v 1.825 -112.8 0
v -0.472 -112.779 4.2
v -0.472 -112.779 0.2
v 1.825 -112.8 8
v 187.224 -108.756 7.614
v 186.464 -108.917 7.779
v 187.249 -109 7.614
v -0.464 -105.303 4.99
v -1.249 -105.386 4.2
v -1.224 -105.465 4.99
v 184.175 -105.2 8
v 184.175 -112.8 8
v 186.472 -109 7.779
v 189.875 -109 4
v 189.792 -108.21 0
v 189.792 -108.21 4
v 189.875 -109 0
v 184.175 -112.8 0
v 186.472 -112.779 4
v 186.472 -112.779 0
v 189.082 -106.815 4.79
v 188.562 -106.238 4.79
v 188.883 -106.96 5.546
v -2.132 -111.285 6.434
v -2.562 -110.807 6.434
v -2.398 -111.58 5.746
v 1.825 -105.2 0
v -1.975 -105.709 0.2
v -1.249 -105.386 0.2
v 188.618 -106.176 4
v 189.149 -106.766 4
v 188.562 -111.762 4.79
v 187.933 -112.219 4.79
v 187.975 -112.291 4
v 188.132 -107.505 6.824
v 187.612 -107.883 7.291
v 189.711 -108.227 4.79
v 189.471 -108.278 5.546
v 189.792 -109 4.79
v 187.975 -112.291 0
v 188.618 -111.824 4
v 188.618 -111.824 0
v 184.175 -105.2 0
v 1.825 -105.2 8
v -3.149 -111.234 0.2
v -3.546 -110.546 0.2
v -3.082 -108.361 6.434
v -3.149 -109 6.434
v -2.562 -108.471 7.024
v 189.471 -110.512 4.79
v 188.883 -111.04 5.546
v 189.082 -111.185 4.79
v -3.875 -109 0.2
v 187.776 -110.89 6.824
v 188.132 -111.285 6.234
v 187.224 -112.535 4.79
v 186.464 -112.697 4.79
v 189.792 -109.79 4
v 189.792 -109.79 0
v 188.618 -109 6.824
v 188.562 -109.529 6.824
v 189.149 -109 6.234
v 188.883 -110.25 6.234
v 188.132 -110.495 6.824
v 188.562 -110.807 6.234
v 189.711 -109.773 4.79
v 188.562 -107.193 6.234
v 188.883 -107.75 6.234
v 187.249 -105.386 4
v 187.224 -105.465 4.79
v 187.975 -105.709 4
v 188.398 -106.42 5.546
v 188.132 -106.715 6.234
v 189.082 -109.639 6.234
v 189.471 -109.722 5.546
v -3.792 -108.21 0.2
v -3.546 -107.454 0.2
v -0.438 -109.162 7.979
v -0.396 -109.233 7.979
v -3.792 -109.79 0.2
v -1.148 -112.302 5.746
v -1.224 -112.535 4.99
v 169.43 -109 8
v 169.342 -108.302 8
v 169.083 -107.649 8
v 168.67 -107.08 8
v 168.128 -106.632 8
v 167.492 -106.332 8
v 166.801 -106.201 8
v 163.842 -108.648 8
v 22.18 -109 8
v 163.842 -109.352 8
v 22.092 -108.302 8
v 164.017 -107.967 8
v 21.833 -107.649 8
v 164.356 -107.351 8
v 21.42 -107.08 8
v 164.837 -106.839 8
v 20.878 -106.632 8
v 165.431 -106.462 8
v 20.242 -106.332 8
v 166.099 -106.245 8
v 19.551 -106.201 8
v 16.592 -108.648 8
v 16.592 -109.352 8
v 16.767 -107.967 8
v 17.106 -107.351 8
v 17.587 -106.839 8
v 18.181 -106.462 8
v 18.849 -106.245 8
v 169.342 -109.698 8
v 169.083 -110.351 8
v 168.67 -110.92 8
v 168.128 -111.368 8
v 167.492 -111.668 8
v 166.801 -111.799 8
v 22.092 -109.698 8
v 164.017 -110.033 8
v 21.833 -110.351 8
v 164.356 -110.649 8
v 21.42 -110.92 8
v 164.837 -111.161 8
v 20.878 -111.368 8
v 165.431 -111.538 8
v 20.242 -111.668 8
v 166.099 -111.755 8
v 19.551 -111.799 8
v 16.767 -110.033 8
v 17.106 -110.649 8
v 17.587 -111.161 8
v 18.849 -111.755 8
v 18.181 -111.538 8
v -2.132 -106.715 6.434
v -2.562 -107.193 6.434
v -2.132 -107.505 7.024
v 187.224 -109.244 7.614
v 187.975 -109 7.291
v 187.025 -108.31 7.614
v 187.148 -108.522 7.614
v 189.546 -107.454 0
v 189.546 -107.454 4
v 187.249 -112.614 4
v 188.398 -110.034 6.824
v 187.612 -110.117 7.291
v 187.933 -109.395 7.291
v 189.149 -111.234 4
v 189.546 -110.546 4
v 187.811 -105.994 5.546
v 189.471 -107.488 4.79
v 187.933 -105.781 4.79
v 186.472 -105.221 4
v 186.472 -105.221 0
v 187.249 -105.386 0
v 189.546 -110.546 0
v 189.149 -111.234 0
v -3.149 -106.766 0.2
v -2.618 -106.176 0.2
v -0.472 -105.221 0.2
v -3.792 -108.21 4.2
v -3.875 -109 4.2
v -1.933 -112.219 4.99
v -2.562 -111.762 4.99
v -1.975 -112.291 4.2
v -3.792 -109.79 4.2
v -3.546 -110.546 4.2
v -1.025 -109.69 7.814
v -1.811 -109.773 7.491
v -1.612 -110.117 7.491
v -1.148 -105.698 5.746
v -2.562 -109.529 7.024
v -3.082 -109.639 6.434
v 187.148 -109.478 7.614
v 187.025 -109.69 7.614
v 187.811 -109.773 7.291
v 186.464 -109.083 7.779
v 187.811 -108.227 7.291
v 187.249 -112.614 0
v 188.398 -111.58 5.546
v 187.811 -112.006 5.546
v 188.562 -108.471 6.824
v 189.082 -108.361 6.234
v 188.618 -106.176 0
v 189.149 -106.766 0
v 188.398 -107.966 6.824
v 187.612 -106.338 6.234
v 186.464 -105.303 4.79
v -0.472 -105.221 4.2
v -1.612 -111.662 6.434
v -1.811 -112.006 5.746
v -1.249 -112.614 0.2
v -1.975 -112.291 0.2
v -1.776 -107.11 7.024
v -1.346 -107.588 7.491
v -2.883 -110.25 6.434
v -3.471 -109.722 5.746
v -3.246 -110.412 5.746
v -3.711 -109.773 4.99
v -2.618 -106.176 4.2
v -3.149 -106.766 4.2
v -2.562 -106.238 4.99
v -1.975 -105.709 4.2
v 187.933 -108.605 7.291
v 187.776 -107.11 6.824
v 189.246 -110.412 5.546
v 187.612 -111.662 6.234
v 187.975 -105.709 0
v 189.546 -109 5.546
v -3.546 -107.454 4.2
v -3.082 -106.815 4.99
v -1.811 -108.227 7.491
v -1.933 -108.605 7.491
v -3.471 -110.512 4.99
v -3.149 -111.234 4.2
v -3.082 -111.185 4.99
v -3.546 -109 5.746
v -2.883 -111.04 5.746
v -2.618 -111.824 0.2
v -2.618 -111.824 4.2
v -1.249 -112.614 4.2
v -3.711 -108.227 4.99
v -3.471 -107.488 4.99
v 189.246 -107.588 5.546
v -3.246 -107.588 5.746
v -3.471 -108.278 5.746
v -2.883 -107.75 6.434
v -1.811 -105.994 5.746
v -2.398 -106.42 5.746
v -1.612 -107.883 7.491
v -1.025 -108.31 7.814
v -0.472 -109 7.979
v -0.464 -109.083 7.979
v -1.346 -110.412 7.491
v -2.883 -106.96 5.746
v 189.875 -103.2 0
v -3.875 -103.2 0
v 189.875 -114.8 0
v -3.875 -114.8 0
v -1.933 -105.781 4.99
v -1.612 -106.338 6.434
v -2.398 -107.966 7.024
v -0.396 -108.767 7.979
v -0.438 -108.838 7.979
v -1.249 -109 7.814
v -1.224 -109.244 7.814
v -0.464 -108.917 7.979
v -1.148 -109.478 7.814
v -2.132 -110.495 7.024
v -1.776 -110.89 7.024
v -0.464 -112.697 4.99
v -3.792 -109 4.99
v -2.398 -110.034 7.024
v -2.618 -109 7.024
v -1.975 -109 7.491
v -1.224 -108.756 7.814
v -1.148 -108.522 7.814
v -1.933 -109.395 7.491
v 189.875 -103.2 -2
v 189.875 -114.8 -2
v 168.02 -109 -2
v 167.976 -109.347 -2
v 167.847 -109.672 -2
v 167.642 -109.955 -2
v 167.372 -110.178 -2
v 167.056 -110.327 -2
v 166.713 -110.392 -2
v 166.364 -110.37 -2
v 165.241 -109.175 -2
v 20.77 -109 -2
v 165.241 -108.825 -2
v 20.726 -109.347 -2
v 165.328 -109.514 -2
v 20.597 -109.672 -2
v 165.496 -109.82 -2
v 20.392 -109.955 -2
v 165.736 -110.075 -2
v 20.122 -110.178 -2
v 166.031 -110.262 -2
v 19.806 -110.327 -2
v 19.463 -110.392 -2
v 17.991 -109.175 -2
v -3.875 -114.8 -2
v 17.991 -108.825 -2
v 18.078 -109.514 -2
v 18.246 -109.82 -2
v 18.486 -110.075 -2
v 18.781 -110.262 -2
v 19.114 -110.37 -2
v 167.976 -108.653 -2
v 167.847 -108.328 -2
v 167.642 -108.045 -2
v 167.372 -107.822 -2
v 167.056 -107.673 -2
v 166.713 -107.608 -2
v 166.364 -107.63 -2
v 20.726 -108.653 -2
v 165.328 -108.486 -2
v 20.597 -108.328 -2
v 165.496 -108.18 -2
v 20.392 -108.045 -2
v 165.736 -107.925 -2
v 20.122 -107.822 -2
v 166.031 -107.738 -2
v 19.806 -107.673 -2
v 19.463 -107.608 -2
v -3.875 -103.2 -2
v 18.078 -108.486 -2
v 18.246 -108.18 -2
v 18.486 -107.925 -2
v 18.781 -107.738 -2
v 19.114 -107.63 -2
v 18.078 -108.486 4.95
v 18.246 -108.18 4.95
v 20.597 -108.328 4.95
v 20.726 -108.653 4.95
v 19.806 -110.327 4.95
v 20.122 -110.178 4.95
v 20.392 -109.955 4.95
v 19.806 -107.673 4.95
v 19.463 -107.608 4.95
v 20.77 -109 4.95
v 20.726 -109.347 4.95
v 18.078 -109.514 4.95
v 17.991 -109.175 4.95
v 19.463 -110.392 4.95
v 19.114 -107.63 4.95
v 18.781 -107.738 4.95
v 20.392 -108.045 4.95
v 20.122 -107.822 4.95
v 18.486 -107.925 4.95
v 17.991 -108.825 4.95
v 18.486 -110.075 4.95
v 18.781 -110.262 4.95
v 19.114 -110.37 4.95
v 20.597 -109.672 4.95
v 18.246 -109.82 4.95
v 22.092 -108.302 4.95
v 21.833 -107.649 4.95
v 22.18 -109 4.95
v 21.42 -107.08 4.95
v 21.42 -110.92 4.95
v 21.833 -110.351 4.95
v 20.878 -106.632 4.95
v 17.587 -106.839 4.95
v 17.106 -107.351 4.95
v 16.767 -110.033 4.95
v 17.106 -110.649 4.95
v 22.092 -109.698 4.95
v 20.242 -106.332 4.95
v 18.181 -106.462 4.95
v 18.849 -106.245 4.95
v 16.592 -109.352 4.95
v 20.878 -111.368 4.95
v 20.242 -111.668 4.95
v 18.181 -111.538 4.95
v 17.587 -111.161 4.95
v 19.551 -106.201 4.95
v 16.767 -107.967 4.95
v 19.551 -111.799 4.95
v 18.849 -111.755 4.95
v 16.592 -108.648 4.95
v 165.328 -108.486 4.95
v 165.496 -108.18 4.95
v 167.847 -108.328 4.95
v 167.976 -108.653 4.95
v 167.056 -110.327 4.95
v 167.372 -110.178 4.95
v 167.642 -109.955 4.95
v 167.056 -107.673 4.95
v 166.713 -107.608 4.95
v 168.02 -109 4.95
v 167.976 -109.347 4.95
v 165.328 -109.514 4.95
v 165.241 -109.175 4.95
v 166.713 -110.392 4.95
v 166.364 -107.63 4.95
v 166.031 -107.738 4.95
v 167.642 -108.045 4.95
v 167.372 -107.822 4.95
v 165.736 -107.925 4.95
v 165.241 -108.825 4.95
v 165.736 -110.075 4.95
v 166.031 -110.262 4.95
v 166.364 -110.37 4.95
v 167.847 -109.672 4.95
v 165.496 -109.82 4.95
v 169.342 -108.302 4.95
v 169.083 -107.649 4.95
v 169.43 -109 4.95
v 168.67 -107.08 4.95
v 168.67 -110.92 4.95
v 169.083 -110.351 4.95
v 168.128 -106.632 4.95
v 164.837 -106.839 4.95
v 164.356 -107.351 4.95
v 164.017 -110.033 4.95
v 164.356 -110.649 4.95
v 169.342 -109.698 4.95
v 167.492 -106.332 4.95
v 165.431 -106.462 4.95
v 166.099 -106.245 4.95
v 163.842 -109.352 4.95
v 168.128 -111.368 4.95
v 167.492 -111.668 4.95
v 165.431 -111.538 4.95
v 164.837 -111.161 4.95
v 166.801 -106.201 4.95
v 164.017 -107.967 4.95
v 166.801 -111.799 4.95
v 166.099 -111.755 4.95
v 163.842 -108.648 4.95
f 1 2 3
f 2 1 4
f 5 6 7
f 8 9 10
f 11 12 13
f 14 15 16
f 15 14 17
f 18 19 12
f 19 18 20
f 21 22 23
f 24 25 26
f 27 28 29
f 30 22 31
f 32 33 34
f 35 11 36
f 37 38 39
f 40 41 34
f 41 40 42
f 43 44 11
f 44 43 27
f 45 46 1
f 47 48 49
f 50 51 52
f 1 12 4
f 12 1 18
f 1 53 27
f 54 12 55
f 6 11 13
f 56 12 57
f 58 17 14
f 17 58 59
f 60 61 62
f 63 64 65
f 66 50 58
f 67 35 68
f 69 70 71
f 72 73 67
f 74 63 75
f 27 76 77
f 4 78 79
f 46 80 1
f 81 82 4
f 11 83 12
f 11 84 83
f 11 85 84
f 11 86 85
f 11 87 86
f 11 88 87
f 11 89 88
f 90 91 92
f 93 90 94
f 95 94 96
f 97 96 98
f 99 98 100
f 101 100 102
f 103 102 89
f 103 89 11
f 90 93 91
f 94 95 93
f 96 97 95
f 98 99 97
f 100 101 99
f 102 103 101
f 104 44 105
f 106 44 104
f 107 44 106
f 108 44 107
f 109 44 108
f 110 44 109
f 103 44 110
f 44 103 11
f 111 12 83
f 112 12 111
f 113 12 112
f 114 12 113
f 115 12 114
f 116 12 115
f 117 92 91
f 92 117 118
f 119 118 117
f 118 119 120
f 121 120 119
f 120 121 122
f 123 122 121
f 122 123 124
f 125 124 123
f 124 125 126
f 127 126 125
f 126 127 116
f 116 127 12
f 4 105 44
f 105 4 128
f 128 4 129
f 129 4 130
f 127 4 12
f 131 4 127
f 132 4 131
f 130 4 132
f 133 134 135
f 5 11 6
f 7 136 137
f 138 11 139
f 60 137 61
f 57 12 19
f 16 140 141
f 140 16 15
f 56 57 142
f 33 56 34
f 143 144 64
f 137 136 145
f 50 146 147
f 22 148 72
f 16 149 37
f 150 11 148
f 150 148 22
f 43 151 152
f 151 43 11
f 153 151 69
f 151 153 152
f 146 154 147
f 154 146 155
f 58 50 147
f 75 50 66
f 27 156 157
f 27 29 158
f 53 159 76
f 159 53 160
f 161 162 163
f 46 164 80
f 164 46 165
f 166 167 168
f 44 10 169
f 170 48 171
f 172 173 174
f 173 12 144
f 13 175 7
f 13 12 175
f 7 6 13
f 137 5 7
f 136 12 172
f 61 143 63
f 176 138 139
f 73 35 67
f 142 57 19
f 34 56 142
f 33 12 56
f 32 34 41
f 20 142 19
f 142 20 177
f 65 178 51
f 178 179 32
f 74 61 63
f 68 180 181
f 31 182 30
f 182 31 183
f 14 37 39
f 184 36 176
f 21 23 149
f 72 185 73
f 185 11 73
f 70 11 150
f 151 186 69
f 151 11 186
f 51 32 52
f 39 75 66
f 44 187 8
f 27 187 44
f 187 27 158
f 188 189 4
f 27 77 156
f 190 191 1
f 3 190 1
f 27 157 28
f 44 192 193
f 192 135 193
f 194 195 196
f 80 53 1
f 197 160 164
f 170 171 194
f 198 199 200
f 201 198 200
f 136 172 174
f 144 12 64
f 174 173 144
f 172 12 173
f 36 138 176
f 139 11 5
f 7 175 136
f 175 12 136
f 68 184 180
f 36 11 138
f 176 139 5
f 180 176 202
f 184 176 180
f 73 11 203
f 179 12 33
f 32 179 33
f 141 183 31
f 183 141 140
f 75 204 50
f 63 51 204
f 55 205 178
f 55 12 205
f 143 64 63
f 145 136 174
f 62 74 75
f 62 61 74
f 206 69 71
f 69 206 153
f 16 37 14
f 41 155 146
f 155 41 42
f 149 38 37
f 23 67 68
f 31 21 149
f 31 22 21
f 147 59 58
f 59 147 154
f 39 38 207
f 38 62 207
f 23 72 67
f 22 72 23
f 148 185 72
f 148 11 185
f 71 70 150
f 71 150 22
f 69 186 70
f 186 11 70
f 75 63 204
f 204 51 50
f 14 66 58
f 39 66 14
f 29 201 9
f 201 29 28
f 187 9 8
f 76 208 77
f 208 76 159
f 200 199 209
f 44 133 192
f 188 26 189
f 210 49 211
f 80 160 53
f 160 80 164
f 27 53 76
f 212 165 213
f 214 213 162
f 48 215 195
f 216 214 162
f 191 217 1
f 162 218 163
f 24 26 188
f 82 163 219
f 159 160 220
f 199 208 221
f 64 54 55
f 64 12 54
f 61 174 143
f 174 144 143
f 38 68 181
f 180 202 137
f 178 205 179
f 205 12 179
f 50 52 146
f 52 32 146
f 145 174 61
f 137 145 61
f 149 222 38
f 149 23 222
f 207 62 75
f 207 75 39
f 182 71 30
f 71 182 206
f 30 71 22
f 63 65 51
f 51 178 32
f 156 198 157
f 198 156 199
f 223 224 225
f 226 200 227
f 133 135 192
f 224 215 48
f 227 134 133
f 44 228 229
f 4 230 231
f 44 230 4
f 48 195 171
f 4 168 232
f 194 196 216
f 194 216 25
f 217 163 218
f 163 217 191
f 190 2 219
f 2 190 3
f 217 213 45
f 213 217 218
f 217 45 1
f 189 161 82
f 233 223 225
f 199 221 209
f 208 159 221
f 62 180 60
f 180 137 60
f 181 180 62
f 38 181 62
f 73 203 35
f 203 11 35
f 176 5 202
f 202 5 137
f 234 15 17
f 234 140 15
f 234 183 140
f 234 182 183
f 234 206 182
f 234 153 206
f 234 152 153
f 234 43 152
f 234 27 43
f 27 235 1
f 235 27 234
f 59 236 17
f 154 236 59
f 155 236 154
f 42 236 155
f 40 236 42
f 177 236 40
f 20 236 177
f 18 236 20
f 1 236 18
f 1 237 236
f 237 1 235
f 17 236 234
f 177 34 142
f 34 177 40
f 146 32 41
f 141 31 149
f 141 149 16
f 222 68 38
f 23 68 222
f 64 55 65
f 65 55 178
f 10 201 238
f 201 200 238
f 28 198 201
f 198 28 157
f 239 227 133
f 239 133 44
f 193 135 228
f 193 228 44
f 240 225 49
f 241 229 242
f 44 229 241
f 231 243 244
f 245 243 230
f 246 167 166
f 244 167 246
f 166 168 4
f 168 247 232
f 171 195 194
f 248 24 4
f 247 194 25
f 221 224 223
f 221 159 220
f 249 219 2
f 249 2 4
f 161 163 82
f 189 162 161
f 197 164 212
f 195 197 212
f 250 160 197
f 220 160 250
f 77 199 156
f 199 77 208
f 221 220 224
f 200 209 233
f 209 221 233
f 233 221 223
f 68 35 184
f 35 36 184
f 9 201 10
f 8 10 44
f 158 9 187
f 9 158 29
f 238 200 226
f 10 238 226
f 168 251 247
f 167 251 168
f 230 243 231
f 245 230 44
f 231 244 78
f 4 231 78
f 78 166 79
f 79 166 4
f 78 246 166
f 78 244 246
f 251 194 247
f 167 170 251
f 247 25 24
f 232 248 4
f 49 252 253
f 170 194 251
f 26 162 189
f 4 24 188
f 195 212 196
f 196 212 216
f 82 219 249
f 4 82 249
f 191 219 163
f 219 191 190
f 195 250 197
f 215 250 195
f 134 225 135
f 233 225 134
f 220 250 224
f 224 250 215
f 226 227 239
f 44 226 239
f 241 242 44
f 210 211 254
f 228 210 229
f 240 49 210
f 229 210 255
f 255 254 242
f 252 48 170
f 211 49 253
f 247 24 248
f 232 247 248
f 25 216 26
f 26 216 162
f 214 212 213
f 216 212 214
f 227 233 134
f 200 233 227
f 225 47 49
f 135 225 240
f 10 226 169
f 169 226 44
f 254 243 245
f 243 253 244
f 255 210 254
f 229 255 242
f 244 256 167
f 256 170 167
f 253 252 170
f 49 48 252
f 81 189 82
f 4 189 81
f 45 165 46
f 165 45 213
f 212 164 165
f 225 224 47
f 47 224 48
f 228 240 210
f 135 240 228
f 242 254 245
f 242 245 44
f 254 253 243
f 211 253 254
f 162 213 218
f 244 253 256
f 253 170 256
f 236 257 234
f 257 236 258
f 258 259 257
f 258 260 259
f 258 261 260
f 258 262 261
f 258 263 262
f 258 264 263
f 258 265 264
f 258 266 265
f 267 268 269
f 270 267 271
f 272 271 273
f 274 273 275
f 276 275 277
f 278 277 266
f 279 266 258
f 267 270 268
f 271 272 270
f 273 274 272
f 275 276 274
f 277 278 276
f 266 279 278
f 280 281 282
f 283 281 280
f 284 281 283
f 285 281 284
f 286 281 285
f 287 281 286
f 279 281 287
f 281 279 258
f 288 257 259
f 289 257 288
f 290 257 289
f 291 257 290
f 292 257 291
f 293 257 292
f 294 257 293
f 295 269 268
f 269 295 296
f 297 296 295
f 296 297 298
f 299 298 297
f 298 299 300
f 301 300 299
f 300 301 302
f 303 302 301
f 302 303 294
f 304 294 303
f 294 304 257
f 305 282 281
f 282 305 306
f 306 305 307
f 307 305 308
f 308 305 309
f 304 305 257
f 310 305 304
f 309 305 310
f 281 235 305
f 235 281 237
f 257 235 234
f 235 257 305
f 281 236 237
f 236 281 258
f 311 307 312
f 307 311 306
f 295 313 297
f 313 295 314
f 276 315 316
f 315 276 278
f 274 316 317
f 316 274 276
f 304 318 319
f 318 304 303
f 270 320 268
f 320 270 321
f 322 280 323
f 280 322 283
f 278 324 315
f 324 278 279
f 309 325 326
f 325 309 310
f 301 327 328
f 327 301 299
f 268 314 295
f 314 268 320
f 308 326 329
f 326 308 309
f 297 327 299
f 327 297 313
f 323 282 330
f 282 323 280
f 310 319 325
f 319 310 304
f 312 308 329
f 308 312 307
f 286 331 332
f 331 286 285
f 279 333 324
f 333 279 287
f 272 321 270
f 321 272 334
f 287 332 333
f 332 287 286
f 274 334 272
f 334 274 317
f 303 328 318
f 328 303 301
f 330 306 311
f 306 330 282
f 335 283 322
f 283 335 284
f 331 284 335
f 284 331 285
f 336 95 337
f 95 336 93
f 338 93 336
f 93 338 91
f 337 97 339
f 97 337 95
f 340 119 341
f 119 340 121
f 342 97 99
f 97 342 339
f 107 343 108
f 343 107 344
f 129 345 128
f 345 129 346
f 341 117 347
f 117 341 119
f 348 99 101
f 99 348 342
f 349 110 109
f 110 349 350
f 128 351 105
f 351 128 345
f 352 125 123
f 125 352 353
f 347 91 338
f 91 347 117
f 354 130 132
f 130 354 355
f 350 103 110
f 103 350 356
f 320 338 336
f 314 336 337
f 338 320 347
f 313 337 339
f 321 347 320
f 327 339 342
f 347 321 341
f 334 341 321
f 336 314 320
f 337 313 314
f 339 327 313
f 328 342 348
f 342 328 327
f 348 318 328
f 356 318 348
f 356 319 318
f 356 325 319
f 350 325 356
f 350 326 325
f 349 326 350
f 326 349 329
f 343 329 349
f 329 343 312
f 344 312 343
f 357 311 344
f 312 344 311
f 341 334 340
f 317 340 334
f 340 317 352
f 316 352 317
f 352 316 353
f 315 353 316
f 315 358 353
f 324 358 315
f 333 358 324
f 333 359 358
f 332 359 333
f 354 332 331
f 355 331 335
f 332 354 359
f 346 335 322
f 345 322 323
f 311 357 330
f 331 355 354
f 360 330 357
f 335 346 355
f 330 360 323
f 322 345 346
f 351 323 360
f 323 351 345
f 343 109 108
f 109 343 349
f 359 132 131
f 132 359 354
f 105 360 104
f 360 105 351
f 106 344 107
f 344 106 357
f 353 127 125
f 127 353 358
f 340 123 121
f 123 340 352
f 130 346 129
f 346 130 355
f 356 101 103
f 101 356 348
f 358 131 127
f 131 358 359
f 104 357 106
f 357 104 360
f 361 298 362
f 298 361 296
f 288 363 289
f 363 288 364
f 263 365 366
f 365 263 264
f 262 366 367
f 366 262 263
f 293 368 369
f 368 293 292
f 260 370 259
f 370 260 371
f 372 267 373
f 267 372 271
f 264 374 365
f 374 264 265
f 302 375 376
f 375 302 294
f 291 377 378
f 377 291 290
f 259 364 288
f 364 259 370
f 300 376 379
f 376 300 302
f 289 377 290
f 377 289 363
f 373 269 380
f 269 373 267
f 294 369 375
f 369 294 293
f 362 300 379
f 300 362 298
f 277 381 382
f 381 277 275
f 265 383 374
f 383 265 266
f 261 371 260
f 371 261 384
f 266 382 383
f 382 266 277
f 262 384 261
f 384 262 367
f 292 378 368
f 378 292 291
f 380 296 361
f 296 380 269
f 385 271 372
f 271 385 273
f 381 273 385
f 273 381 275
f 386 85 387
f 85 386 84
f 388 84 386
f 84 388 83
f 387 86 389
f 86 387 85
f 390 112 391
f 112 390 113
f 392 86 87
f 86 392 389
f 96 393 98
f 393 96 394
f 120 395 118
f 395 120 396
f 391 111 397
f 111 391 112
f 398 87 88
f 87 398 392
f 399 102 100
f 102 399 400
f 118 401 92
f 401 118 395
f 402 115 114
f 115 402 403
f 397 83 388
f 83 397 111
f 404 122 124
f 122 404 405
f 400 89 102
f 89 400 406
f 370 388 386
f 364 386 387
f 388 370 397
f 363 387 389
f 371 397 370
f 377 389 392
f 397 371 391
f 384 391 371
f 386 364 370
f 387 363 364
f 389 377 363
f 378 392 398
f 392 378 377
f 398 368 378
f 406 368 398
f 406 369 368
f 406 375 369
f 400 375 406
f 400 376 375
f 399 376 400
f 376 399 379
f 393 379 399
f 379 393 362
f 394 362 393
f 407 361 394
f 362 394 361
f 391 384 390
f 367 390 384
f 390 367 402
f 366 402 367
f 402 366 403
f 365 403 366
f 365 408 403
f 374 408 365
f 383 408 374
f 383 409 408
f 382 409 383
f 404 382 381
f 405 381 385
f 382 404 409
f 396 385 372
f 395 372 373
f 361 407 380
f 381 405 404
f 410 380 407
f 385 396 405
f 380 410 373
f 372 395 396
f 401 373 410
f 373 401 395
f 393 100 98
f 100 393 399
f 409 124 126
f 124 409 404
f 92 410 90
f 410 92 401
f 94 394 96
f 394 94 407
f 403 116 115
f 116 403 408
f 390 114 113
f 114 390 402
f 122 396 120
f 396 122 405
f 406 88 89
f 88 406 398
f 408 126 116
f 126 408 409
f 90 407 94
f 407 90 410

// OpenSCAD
// file: ../modules/roundedRail.scad
include<params.scad>;

module roundedRail(width,depth,height) {
    $fn = 30;
    rad = depth/2;
    translate([-width/2,0,0])
    hull() {
        translate([width/2,0,0])
        cube([width-rad*3,depth,height], center = true);
        translate([rad, 0, height/2 - rad]) {
            sphere(rad);
            translate([0,0,-height/2 + 0.5])
            cylinder(1,rad,rad, center = true);
        }
        translate([width - rad,0,0])
        {
            sphere(rad);
            translate([0,0,-height/2 + 0.5])
            cylinder(1,rad,rad, center = true);
        }
    }
}
// file: ../modules/needlebedScrews.scad
include<params.scad>;
//include<needlebed.scad>;

module screwHoles(screw) {
    
    
    // "screw" is passed in during the loop to place holes at either end of the assembly
    if (screw > 0) { //left half
       // spongebar screw
       translate([gauge/2,-(NEEDLE_BED_DEPTH-COMB) + SPONGE_BAR/2, 0]) {
         cylinder(h = needleBedHeight*2 + 1, d = screwDiamSm, center = true, $fn = 25); 
         translate([0,0,railHeight]) 
             cylinder(h = screwHeadHeight*2 + tolerance, d = screwHeadDiamSm, center = true, $fn = 25);   
       }
       // back screw, back cover
       translate([gauge/2, -5, 0]) {
         cylinder(h = needleBedHeight*2 + 1, d = screwDiamSm, center = true, $fn = 25);
                cylinder(h = screwHeadHeight*2 + tolerance, d = screwHeadDiamSm, center = true, $fn = 25);   
       }    
         // front screw, back cover
       translate([gauge/2, -BACK_COVER + 5, 0]) {
         cylinder(h = needleBedHeight*2 + 1, d = screwDiamSm, center = true, $fn = 25);  
          cylinder(h = screwHeadHeight*2 + tolerance, d = screwHeadDiamSm, center = true, $fn = 25);   
       }
     }
     
     if (screw < 0) { //right half
       // spongebar screw
       translate([-gauge/2,-(NEEDLE_BED_DEPTH-COMB) + SPONGE_BAR/2, 0]) {
         cylinder(h = needleBedHeight*2 + 1, d = screwDiamSm, center = true, $fn = 25); 
         translate([0,0,railHeight]) 
             cylinder(h = screwHeadHeight*2 + tolerance, d = screwHeadDiamSm, center = true, $fn = 25);   
       }
       // back screw, back cover
       translate([-gauge/2, -5, 0]) {
         cylinder(h = needleBedHeight*2 + 1, d = screwDiamSm, center = true, $fn = 25);
                cylinder(h = screwHeadHeight*2 + tolerance, d = screwHeadDiamSm, center = true, $fn = 25);   
       }    
         // front screw, back cover
       translate([-gauge/2, -BACK_COVER + 5, 0]) {
         cylinder(h = needleBedHeight*2 + 1, d = screwDiamSm, center = true, $fn = 25);  
          cylinder(h = screwHeadHeight*2 + tolerance, d = screwHeadDiamSm, center = true, $fn = 25);   
       }
     }
  
}

//screwHoles(screw = 1);
module needleBedScrews() {
    for(i = [0:numNeedles-1]) {
        if (i==screwPlacement || i==numNeedles-screwPlacement) {
              translate([gauge*i, 0, 0]) {
              screwHoles(screw = -1); 
              }
        } else if (i == screwPlacement - 1 || i==numNeedles-(screwPlacement + 1)) {
            //LS screw holes
                translate([gauge*i, 0, 0])
                screwHoles(screw = 1);  
        }
    }
}

needleBedScrews() {
}
// file: ../modules/params.scad
/*

Values in `camelCase` are user-variable (within reason); 
values like numNeedles and screwDiam, etc.,  can be modified to
accommodate user preference or hardware subsitution. 

Values in `ALL_CAPS` should be considered CONSTANTS and should
only be modified with *extreme caution* as they will affect the 
relationship between the needles and the cams, which could
prevent stitches from forming correctly.

I recommend only modifying these constants if you are also 
making changes to the cam design in the technical sketch.
*/

$fn = 50;

STANDARD_GAUGE = 4.5;
MID_GAUGE = 6.5;
BULKY_GAUGE = 9.0;
BRIAN_GAUGE = 7.75;

gauge = BRIAN_GAUGE;
// gauge = STANDARD_GAUGE; // I recommend using one of the predefined gauges above
numNeedles = 25;
tolerance = 0.2; // allows a bit of room for parts that have to fit together; adjust according to your printer's precision

// ---
// Hardware dimensions 
// (actual measurements, no tolerances)

// - pan head 6-32 machine screws
screwDiam = 3.45;
screwHeight = 18;
screwHeadDiam = 6.75 + tolerance * 2; 
screwHeadHeight = 2.55 + tolerance * 2;
nutWidth = 7.9;

// - pan head 4-40 machine screws (M3 should also work where these are used)
screwDiamSm = 2.79;
screwHeightSm = 14.62;
screwHeadHeightSm = 2.41 + tolerance * 2;
screwHeadDiamSm = 5.21 + tolerance * 2;
nutHeight = 2.8;

// ---
// Needle dimensions
// - Brother needles
BUTT_HEIGHT = 15;
NEEDLE_WIDTH = 1.25;
NEEDLE_LEG_HEIGHT = 1.85;
HOOK_DIAM = 3.5;

// ---
// Needle Bed Zones
BACK_COVER = 45;
OOW_TRACK = 8;
B_TRACK = 42; // will divvy up working tracks (B & C position) later
C_TRACK = 0;
WORKING_TRACK = B_TRACK + C_TRACK;
HOLD_TRACK = 8;
SPONGE_BAR = 12;
COMB = 29;
NEEDLE_EXTENSION = 34.5;

// ---
// Needle bed dimensions
NEEDLE_BED_DEPTH = BACK_COVER + OOW_TRACK + WORKING_TRACK + HOLD_TRACK + SPONGE_BAR + COMB;
needleBedHeight = screwHeight + 2;
needleSlotHeight = NEEDLE_LEG_HEIGHT * 2 + screwHeadHeight;
needleSlotWidth = NEEDLE_WIDTH + 0.25; // add a small amount of clearance
combWidth = gauge*2/3; // width of cutouts for stitch formation; this gives room for the thickness of the yarn looped around the needle when it pulls back into the slot, but has to balance leaving enough material for the remaining "teeth" to not be too fragile
spongeThickness = 2.5;
spongeBarThickness = needleSlotHeight - NEEDLE_LEG_HEIGHT - spongeThickness;
YARN_DEPOSIT_Y = -155.1;
YARN_DEPOSIT_Z = -needleSlotHeight + HOOK_DIAM;
connectorOffset = 20;

screwPlacement = 3; // how many needles from edge of bed; min 2, max floor(numNeedles/2)

// ---
// Carriage dimensions
// refer to technical sketch
camHeight = BUTT_HEIGHT; // thickness of the tracks the needles ride along
camPlateHeight = 4; // plate behind the cams
CAM_PLATE_WIDTH = 91 * 2; 
CAM_PLATE_DEPTH = NEEDLE_BED_DEPTH - COMB + 6;

railDepth = 8;
railHeight = 8; // ???
xOffset = 16.5;
//vCamScrews = [[34-xOffset, -90.25, 0],[58-xOffset, -74.25, 0],[86-xOffset,-90.25, 0]];

echo(needleSlotHeight);
// main file
include<../modules/params.scad>;
use<../modules/needlebedScrews.scad>;
use<../modules/roundedRail.scad>;


module spongeBar(width = gauge) { 
            translate([0,-(NEEDLE_BED_DEPTH-COMB) + SPONGE_BAR/2, -1])
            cube([width,SPONGE_BAR - tolerance*2,2], center = true);
}

module frontRail(width = gauge, rounded = false, tolerance = tolerance) {
    translate([0,-(NEEDLE_BED_DEPTH-COMB) + SPONGE_BAR/2, railHeight/2]) {
        if (rounded) {
            roundedRail(width, railDepth - tolerance*2, railHeight);
        } else {
            cube([width, railDepth - tolerance*2, railHeight], center = true);
        }
    }
}



difference() {
    union() {
        translate([(gauge*numNeedles)/2 - gauge/2, 0, 0]) {
        frontRail(width = (numNeedles) * gauge, rounded = true);
        }
                    translate([gauge*numNeedles/2 - gauge/2, 0, 0])

            spongeBar(width = numNeedles*gauge);
    }
        needleBedScrews();
}
